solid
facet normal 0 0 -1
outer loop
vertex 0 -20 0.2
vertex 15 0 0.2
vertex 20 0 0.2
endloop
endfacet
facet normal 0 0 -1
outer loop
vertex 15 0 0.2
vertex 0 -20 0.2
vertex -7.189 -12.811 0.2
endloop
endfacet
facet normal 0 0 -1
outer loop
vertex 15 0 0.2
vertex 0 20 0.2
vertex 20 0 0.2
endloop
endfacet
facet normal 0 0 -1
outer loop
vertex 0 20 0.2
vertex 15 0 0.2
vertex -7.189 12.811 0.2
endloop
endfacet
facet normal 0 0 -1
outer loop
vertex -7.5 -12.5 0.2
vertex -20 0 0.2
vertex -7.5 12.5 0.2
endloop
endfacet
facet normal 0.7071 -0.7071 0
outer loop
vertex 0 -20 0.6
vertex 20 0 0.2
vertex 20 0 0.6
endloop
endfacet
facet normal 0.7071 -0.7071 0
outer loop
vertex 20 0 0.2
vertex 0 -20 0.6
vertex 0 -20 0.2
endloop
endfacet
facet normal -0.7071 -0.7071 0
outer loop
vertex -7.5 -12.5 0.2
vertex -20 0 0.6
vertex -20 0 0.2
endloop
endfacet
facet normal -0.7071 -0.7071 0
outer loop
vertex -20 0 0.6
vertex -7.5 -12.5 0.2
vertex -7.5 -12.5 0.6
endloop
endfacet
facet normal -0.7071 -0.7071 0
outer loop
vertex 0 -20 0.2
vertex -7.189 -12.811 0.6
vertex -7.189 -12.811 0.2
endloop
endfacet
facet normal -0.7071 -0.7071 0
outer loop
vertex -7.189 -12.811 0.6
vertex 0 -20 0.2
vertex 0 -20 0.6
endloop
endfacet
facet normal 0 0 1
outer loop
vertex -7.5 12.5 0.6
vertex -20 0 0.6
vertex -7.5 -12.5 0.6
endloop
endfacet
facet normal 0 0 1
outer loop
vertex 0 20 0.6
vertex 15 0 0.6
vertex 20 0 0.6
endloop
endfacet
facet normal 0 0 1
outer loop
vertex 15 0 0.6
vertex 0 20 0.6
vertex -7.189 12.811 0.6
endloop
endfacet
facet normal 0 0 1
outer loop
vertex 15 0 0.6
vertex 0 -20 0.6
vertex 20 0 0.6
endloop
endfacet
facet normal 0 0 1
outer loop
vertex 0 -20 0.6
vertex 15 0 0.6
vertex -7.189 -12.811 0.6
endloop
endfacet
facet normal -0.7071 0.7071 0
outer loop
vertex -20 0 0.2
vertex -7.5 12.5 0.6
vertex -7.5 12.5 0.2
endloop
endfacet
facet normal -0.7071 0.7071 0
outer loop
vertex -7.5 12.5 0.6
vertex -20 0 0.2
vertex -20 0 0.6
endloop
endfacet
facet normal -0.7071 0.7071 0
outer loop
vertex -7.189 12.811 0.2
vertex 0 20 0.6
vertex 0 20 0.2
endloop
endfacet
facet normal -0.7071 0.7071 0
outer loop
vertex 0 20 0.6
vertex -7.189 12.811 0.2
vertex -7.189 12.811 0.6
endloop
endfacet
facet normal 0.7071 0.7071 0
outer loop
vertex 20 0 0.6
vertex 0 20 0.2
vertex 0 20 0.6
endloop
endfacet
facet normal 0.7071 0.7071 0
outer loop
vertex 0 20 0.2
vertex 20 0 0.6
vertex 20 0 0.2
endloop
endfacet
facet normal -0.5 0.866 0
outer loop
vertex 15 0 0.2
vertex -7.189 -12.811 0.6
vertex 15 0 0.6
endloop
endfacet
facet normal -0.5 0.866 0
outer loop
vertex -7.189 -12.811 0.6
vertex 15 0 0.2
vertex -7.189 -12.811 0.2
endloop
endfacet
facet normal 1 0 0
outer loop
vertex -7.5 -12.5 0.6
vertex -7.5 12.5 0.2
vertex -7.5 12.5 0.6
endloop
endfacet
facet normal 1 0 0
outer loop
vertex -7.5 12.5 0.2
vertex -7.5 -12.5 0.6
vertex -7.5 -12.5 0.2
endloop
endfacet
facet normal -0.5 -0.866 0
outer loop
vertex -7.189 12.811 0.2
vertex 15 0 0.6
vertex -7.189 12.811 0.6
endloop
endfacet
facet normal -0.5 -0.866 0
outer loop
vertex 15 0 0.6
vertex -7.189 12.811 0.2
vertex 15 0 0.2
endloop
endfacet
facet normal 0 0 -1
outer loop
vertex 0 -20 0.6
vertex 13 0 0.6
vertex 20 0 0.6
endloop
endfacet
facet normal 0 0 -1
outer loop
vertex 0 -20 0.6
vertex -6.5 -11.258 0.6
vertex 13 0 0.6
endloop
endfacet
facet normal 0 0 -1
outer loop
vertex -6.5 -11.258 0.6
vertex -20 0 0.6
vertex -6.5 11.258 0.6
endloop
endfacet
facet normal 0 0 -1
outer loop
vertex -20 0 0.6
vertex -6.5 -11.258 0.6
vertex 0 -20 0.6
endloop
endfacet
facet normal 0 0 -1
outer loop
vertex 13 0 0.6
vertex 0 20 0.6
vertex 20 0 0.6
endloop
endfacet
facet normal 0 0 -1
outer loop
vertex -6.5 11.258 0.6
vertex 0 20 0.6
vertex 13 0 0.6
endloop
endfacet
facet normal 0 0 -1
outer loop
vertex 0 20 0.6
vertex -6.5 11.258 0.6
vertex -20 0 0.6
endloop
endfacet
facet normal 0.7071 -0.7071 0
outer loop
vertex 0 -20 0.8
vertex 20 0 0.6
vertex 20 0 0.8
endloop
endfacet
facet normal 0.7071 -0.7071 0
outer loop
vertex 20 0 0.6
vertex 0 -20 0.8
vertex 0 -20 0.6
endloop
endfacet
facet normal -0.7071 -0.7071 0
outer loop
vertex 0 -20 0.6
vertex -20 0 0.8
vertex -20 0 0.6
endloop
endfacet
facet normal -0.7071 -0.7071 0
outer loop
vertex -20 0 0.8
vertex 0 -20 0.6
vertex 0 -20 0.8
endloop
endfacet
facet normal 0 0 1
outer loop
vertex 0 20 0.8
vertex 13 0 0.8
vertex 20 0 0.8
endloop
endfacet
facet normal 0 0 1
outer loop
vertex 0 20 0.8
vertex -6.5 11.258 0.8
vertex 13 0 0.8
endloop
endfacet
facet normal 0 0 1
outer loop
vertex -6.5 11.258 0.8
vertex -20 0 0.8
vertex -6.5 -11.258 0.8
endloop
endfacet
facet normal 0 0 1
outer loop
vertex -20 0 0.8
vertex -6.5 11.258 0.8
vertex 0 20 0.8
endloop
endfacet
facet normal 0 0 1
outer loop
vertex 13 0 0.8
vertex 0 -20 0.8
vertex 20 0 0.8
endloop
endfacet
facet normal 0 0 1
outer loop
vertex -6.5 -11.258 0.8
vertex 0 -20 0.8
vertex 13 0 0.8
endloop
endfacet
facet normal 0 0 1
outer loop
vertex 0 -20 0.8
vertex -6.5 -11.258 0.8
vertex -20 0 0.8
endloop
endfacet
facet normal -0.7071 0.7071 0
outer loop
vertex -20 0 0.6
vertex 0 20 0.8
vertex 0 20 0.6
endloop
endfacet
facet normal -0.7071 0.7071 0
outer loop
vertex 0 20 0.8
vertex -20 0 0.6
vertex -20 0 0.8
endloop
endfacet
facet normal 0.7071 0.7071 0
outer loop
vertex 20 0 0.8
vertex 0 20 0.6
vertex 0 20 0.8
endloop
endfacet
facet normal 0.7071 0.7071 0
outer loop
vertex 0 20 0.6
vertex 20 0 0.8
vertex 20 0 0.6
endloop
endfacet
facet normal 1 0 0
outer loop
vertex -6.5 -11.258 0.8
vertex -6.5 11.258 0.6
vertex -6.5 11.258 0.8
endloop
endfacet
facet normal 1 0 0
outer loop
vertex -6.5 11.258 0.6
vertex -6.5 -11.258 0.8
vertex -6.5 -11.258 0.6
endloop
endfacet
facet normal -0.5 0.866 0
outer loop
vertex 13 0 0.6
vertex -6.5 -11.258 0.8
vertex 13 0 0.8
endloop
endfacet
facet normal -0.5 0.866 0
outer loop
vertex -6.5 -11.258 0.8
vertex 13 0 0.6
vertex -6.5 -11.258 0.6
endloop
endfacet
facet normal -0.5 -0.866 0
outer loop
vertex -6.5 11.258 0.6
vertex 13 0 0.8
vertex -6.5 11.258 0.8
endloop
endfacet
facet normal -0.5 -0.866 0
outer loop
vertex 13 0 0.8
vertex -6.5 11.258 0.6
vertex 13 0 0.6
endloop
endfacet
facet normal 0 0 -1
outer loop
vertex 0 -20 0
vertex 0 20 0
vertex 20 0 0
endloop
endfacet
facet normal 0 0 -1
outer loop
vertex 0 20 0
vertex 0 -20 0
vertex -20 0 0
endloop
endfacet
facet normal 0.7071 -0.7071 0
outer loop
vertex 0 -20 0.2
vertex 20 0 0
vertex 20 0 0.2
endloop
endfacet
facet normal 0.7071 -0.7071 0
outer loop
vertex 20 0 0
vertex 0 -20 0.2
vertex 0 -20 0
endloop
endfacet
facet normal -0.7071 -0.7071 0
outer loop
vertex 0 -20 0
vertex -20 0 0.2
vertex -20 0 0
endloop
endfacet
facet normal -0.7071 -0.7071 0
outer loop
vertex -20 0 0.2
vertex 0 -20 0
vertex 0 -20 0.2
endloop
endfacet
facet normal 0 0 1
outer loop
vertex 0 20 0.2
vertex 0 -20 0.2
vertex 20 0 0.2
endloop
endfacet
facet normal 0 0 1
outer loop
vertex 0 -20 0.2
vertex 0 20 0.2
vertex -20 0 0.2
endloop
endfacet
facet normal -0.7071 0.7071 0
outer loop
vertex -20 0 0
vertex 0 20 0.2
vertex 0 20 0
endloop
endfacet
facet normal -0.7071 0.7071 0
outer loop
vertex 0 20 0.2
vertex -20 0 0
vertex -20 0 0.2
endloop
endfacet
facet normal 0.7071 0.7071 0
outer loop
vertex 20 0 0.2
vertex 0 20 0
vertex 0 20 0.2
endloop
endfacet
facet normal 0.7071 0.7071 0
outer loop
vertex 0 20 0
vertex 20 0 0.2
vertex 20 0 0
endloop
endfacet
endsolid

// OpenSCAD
// mirror_shapes.scad -
//
// Each shape is composed of three layers:
// - The base layer is solid, with sides and radius of OuterShape*
//
// - The middle layer has a hole in the middle. The later has sides
//   and radius of OuterShape*, and the hole has sides and radius
//   determined by InnerShape*.


/* [Outer Shape] */

// Number of sides of outer shape
_OuterShapeSides = 4;

// Radius of outer shape
_OuterShapeRadius = 20;

/* [Inner Shape] */

// Number of sides of inner shape
_InnerShapeSides = 3;

// Radius of inner shape
_InnerShapeRadius = 15;

// Rotation for inner shape
_InnerShapeRotation = 0;

/* [Lid] */

// Lid inset
_LidInset = 2;

/* [Z] */ 

// Base thickness (plate to fabric)
_BaseThickness = 0.2;

// Inner shape thickness (above fabric)
_InnerShapeThickness = 0.4;

// Lid thickness (retains mirror)
_LidThickness = 0.2;

module OuterShape(ShapeRadius, ShapeSides, ShapeThickness)
{
  // Outer shape
  linear_extrude(ShapeThickness)
  {
    circle(r=ShapeRadius, $fn=ShapeSides);
  }
}

module InnerShape(ShapeRotation, ShapeRadius, ShapeSides, ShapeThickness)
{
  rotate([0, 0, ShapeRotation])
  {
    // Outer shape
    linear_extrude(ShapeThickness)
    {
        circle(r=ShapeRadius, $fn=ShapeSides);
    }
  }
}

module main(OuterShapeSides, OuterShapeRadius, LidInset, InnerShapeSides, InnerShapeRadius, InnerShapeRotation, BaseThickness, InnerShapeThickness, LidThickness, LidInset)
{
    union()
    {
        // Outer shape below fabric
        OuterShape(OuterShapeRadius, OuterShapeSides, BaseThickness);
        
        // Outer shape above fabric with hole for inner shape / mirror
        translate([0, 0, BaseThickness])
        {
            difference()
            {
                OuterShape(OuterShapeRadius, OuterShapeSides, InnerShapeThickness);

                InnerShape(InnerShapeRotation, InnerShapeRadius, InnerShapeSides, InnerShapeThickness + .001);
            }
        }
        
        // Lid that locks in mirror
        translate([0, 0, BaseThickness + InnerShapeThickness])
        difference()
        {
            OuterShape(OuterShapeRadius, OuterShapeSides, LidThickness);
            InnerShape(InnerShapeRotation, InnerShapeRadius - LidInset, InnerShapeSides, InnerShapeThickness + .001);
        }
    }    
  
}

main(_OuterShapeSides, _OuterShapeRadius, _LidInset, _InnerShapeSides, _InnerShapeRadius, _InnerShapeRotation, _BaseThickness, _InnerShapeThickness, _LidThickness, _LidInset);
